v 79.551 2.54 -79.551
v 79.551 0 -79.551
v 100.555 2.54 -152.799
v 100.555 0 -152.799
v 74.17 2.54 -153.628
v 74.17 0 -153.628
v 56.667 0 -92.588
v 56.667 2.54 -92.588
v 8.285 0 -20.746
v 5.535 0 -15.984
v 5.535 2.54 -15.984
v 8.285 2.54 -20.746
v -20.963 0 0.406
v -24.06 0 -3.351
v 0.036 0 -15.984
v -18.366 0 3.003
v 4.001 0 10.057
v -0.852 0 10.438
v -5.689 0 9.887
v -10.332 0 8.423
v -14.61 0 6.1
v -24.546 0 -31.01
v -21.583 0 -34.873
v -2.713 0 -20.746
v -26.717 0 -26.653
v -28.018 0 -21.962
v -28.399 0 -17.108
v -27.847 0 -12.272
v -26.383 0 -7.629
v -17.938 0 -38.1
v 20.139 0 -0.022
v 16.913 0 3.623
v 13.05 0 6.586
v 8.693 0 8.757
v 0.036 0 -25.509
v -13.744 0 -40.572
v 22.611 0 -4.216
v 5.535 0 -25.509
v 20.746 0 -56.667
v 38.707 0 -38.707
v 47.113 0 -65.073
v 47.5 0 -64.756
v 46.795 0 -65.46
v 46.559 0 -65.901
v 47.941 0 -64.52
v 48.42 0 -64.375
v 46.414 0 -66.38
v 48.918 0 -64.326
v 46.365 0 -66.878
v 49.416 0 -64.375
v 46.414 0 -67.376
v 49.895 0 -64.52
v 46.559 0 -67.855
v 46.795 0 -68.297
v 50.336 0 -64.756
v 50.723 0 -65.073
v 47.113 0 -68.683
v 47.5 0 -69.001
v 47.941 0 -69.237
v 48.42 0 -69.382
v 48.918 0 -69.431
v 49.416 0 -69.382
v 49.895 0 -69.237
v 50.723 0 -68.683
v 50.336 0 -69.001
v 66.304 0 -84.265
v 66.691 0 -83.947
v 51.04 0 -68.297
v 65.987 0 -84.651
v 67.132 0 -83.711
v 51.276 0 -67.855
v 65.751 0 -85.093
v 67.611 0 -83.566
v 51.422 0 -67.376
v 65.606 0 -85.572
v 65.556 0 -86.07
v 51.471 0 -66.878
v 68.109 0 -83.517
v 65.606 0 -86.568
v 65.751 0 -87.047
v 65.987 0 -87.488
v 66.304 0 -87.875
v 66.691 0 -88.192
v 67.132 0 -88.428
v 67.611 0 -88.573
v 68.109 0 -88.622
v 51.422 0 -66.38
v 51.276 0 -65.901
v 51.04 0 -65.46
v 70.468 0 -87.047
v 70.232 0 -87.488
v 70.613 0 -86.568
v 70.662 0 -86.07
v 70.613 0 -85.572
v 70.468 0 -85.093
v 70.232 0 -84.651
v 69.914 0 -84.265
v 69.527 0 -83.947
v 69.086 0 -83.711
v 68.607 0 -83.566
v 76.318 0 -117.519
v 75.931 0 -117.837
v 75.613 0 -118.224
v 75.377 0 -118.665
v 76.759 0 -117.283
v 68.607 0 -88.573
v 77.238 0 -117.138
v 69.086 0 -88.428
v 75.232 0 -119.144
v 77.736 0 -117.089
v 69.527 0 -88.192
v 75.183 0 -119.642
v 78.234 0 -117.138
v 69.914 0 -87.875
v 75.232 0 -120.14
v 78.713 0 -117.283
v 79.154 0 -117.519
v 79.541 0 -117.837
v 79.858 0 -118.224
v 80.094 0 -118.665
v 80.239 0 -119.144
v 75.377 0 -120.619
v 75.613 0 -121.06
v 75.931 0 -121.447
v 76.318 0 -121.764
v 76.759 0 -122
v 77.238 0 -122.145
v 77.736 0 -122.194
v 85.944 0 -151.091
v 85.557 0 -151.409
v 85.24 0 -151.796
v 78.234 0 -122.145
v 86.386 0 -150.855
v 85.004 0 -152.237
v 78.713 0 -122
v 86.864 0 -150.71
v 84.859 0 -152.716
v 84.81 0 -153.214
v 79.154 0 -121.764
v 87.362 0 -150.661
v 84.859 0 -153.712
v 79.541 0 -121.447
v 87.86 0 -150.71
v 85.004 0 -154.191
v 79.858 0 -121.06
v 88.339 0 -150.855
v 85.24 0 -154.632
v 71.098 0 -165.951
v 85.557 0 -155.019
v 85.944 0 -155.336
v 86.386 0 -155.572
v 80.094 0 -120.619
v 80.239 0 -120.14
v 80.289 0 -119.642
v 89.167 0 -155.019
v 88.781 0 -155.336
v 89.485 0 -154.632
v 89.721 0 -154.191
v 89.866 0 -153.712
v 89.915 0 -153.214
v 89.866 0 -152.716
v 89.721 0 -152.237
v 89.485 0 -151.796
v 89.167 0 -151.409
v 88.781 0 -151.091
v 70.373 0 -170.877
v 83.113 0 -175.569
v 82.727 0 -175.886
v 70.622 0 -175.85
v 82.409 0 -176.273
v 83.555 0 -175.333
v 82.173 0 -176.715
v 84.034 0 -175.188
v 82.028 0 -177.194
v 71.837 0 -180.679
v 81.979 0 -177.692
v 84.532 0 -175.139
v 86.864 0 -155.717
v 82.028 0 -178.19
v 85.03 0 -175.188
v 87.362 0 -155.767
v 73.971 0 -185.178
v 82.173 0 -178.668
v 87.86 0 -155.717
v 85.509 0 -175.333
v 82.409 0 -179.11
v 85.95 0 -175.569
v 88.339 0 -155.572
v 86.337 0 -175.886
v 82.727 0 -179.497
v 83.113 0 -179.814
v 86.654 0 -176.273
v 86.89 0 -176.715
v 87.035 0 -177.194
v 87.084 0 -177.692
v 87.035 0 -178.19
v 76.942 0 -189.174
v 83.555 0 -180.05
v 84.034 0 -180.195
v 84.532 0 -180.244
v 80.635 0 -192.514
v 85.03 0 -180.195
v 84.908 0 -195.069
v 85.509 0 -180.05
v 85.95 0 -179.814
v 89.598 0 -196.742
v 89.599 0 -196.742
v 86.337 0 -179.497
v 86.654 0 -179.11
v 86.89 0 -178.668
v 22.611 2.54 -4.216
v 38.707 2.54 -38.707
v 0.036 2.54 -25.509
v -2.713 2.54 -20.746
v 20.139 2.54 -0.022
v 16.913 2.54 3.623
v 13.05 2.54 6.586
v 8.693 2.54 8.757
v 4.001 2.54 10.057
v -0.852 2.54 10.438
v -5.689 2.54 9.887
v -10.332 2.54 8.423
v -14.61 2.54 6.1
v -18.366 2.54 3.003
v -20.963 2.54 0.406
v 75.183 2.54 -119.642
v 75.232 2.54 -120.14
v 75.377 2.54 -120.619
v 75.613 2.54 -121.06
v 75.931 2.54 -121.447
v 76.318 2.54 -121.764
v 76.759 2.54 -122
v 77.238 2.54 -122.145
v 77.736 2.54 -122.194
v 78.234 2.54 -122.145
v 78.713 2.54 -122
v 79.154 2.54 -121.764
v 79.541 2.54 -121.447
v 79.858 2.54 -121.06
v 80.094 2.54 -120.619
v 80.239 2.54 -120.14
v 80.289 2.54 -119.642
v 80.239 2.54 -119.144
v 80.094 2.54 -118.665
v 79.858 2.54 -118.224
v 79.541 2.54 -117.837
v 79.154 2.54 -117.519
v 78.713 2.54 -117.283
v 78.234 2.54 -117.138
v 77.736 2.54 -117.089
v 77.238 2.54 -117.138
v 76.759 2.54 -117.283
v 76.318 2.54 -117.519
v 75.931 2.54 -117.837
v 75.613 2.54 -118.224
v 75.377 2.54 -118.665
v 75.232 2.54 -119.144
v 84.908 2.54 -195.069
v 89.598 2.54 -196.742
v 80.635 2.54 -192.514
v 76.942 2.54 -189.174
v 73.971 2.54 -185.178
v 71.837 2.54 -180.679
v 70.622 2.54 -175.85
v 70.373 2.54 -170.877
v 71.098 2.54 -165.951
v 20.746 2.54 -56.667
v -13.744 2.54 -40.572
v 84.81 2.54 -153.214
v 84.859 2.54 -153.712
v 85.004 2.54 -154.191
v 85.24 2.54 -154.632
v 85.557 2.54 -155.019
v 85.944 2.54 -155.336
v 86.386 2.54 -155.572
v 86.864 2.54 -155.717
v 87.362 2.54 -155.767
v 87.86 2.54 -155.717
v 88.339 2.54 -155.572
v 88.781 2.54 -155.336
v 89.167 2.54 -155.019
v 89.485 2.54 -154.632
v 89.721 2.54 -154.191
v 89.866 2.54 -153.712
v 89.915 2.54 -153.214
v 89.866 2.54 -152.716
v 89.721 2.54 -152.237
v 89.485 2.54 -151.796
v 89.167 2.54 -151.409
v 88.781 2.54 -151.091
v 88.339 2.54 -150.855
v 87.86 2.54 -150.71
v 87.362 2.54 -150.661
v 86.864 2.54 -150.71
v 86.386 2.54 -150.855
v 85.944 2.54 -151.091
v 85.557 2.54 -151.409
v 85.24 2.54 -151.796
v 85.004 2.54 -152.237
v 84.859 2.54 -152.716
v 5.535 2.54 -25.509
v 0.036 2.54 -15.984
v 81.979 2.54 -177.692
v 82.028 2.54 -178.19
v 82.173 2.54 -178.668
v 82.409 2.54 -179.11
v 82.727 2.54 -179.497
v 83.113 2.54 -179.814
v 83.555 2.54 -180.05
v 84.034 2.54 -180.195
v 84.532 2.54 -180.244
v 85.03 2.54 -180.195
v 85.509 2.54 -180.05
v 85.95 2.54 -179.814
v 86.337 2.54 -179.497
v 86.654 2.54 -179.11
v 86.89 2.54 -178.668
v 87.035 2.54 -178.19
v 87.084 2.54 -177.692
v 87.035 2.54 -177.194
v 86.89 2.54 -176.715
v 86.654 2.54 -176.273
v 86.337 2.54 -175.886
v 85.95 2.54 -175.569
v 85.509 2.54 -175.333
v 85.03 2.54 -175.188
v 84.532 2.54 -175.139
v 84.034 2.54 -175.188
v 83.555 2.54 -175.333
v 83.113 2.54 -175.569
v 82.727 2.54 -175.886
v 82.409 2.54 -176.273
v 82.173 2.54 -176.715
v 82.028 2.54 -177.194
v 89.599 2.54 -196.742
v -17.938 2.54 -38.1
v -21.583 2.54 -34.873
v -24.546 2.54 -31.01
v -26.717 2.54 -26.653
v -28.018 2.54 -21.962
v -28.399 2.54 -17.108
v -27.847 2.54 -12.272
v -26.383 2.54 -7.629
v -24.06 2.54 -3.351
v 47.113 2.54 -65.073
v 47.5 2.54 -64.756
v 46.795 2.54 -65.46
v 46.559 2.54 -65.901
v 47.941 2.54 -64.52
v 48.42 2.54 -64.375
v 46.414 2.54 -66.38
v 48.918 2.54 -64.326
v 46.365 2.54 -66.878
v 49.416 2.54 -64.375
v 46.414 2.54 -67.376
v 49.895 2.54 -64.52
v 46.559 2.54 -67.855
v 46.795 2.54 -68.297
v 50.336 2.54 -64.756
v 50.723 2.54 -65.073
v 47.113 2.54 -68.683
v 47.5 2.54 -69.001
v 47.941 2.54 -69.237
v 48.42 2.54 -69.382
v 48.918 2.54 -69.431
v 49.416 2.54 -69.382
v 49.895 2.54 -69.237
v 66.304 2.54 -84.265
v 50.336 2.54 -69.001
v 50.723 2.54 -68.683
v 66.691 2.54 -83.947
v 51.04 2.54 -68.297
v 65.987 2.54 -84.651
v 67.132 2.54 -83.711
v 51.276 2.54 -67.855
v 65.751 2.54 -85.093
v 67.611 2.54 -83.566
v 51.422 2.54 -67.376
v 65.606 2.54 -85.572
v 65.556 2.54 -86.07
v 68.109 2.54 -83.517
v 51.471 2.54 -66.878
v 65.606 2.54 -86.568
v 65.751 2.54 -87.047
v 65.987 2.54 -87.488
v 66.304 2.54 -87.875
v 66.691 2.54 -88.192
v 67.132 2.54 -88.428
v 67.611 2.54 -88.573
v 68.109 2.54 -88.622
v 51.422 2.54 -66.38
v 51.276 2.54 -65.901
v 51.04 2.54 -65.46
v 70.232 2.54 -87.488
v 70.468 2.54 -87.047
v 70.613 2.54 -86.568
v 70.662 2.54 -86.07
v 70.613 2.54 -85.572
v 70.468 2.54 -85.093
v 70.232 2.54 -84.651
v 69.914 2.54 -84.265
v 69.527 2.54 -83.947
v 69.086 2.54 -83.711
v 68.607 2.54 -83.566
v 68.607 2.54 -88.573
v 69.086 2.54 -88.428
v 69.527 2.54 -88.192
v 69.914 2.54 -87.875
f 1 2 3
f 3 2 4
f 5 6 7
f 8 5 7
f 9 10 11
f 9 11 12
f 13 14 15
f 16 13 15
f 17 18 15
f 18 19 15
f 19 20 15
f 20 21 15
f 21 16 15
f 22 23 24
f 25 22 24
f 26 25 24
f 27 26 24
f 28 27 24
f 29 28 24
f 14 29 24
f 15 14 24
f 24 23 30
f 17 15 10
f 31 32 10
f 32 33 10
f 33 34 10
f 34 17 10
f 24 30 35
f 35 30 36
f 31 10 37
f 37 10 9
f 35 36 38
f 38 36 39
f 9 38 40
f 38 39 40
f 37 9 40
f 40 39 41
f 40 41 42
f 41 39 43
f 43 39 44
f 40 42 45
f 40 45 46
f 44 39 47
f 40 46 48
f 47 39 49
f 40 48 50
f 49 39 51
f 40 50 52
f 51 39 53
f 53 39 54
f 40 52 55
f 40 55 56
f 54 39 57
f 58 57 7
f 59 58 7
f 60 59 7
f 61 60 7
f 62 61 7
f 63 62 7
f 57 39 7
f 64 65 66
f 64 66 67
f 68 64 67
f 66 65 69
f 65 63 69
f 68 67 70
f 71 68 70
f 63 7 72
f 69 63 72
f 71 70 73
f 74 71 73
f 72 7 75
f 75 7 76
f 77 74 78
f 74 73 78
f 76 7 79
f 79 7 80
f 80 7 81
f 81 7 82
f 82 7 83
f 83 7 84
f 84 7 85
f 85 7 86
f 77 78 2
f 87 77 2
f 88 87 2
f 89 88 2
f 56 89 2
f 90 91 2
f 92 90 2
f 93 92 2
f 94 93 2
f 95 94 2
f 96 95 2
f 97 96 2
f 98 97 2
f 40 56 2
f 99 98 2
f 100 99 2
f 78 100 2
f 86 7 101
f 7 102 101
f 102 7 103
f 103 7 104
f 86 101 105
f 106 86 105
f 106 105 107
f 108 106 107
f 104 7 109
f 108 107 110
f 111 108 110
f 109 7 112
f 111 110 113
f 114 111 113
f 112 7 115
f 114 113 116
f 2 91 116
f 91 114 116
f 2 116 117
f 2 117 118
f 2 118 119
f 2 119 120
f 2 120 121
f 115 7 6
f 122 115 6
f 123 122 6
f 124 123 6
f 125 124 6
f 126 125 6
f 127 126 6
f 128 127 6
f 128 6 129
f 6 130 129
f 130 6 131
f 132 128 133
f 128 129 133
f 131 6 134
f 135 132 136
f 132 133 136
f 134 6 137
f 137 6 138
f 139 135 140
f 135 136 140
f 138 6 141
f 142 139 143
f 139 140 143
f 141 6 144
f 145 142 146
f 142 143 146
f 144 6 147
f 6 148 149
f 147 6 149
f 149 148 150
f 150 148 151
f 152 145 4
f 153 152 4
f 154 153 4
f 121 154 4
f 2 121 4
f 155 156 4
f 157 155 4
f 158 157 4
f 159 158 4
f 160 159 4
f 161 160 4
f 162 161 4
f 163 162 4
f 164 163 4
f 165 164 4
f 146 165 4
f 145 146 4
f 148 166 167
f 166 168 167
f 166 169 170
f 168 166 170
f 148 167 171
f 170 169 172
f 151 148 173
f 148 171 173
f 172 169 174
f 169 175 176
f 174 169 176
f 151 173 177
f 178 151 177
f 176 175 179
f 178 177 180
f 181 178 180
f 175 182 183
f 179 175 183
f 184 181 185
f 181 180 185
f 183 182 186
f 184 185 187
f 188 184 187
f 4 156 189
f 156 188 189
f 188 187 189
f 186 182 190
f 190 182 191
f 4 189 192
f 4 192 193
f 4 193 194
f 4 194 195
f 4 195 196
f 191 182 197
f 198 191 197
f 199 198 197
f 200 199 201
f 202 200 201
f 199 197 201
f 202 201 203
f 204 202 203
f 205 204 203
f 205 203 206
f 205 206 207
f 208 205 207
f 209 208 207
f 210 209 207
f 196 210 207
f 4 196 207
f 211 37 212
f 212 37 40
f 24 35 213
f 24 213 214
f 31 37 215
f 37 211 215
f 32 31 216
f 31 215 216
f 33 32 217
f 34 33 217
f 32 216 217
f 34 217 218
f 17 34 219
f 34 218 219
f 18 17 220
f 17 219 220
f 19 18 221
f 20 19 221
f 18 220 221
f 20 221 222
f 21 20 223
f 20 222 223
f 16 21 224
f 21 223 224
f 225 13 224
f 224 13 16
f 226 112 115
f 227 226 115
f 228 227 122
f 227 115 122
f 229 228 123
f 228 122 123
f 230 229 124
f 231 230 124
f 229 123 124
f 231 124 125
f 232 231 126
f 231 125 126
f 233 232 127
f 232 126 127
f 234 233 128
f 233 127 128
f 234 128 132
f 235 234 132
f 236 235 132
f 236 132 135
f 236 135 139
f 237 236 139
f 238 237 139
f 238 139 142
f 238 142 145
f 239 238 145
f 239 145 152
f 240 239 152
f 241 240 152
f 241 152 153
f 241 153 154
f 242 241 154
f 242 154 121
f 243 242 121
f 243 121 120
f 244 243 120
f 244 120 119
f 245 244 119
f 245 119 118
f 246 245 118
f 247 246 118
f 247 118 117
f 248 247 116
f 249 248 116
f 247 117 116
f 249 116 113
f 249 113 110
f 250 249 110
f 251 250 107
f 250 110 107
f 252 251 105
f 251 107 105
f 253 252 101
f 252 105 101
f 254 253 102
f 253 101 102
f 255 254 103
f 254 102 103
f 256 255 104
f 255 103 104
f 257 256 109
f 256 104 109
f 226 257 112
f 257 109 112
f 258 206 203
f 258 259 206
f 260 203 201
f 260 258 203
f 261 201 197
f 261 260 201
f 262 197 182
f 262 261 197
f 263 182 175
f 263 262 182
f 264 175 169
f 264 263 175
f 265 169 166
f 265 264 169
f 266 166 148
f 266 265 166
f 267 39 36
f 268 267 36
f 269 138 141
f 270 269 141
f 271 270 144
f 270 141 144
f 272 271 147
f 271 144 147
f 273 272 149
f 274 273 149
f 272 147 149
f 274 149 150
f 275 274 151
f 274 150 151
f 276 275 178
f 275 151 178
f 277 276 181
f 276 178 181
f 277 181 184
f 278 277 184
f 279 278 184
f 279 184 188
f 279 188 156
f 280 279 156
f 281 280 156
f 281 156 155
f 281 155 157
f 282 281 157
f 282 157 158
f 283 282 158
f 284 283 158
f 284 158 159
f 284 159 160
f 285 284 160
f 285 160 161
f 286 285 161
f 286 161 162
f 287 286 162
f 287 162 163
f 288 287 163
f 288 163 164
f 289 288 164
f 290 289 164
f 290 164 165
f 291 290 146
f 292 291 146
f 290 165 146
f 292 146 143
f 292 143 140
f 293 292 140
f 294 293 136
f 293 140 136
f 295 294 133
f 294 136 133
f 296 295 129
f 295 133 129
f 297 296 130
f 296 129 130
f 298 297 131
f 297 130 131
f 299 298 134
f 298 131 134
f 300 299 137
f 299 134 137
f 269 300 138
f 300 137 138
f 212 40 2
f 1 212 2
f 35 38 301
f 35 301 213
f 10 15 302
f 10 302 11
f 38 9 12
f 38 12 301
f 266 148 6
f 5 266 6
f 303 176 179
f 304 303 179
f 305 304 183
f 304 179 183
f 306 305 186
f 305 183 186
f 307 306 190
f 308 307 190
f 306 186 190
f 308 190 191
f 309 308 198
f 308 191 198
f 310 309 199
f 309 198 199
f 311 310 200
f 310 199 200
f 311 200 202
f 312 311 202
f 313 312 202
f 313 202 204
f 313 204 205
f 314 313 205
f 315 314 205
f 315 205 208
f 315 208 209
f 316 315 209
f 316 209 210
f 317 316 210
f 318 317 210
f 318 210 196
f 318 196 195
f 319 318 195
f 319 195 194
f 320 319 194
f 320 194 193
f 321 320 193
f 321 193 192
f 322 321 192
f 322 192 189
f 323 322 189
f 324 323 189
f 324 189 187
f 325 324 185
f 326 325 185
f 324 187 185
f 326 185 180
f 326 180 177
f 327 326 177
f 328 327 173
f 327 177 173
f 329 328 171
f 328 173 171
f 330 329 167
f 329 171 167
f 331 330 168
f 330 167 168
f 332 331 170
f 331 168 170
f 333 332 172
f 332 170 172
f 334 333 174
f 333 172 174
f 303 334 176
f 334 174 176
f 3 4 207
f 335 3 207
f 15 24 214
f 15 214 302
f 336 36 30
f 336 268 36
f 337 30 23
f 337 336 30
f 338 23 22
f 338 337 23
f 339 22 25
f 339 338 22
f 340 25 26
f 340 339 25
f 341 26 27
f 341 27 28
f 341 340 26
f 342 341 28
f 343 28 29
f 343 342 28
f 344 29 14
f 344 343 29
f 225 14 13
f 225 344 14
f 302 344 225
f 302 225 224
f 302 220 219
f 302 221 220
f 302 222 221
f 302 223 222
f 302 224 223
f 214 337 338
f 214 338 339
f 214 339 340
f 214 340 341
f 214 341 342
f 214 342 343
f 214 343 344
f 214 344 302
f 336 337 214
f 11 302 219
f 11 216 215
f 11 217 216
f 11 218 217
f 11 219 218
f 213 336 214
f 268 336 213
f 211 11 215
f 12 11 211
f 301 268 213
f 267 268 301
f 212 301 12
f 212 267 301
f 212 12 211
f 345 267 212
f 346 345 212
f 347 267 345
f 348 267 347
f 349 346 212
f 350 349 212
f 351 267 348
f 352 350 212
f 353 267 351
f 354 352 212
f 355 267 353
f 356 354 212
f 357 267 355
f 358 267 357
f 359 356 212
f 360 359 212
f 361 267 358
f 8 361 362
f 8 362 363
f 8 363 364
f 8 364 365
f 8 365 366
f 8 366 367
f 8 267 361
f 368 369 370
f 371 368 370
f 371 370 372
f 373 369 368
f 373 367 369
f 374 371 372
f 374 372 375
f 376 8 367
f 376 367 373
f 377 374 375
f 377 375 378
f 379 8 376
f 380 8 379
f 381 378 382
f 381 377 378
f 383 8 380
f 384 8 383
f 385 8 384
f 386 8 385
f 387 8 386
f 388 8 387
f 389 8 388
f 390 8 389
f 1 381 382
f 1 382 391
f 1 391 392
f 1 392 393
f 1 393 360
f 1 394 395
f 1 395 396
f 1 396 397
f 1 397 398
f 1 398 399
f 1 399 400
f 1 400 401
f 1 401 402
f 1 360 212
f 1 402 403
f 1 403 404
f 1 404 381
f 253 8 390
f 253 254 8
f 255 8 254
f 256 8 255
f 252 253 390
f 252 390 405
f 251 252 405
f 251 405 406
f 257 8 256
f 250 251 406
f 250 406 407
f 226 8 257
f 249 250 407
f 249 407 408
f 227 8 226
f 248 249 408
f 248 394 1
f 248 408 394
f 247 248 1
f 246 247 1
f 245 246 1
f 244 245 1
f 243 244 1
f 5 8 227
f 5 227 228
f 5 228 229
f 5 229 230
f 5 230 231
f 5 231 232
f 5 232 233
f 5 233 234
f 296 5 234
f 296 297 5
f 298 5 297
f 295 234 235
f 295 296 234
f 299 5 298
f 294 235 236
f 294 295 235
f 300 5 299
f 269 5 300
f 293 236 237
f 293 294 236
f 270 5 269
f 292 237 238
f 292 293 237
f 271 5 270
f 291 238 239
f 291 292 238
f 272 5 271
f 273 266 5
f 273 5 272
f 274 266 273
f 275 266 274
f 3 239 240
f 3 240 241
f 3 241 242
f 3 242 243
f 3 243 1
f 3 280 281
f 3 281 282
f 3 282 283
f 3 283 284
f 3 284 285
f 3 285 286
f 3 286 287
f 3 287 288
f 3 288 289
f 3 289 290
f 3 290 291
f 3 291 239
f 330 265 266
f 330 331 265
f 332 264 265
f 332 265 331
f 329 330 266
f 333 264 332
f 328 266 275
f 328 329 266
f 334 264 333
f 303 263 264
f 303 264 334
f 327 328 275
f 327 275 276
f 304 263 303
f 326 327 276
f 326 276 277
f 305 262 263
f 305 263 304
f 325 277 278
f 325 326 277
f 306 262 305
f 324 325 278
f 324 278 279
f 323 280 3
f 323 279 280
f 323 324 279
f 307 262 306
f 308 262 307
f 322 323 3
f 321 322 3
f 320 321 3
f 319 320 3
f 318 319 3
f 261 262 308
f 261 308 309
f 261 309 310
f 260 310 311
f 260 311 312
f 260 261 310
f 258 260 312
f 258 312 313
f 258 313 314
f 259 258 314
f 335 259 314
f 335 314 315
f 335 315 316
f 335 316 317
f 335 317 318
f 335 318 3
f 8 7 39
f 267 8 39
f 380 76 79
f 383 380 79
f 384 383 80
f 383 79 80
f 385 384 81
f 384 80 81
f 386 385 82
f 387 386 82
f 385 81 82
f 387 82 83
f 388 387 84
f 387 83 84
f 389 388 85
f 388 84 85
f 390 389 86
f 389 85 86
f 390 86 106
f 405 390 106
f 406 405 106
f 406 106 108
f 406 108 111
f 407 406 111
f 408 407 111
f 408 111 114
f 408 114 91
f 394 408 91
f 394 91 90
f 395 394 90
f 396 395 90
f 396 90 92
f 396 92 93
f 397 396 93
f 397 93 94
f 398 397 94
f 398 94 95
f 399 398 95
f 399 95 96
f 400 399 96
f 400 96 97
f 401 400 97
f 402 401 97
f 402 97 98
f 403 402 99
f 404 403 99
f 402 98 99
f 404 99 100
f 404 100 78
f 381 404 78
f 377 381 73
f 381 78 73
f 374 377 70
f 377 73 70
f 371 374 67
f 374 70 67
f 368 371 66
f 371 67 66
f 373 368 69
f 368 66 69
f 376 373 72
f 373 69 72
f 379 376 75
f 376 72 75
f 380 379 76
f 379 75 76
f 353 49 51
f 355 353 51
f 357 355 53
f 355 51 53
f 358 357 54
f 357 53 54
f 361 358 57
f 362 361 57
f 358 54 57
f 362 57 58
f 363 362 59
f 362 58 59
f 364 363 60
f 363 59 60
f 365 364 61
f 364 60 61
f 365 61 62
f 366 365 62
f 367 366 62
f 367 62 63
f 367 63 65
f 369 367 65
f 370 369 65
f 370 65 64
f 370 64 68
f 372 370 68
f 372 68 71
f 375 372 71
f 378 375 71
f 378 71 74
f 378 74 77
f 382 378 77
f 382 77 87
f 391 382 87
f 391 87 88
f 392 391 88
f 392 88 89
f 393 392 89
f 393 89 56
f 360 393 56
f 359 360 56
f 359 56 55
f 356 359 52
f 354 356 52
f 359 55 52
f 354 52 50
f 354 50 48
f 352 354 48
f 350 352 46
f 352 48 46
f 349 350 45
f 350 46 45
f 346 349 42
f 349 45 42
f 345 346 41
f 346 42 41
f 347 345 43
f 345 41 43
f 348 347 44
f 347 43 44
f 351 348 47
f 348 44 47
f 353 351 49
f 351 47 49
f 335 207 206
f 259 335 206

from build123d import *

# Parameters (mm, degrees)
BOSS_EXTRUDE1_DEPTH        = 2.54
FILLET3_R                  = 25.4
F_10_CLEARANCE_HOLE1_D     = 5.1054
F_10_CLEARANCE_HOLE1_DEPTH = 9.906
F_10_CLEARANCE_HOLE1_TIP   = 1.533816902
FILLET4_R                  = 25.4


with BuildPart() as part:
    # Sketch1 → Boss-Extrude1 (new body)
    with BuildSketch(Plane(origin=(0, 0, 0), x_dir=(1, 0, 0), z_dir=(0, 1, 0))):
        Polygon((38.706788555, 38.706788555), (79.551048595, 79.551048595), (100.554615109, 152.799189826), (89.598560117, 196.741526293), (64.953048669, 190.596710145), (74.170272892, 153.628442974), (56.667300797, 92.588325282), (20.746276313, 56.667300797), (-46.605644595, 25.236404374), (7.275892132, -28.645132353), align=None)
        Polygon((8.285025385, 20.746276313), (5.535394728, 25.508776313), (0.036133414, 25.508776313), (-2.713497243, 20.746276313), (0.036133414, 15.983776313), (5.535394728, 15.983776313), align=None, mode=Mode.SUBTRACT)
    extrude(amount=BOSS_EXTRUDE1_DEPTH)

    # Fillet3
    fillet3_edges = [part.edges().sort_by_distance(p)[0] for p in [
        (64.953048669, 1.27, -190.596710145),
    ]]
    fillet(fillet3_edges, radius=FILLET3_R - 0.0001)  # a hair under: the kernel refuses the full size

    # #10 Clearance Hole1
    with Locations(Plane(origin=(0, 2.54, 0), x_dir=(1, 0, 0), z_dir=(0, 1, 0))):
        with Locations((84.531663752, 177.691526293), (87.362444, 153.2138164), (77.735809348, 119.641751669), (68.109174696, 86.069686939), (48.917853565, 66.878365807)):
            Hole(F_10_CLEARANCE_HOLE1_D / 2, depth=F_10_CLEARANCE_HOLE1_DEPTH)
            with Locations((0, 0, -(F_10_CLEARANCE_HOLE1_DEPTH + F_10_CLEARANCE_HOLE1_TIP / 2))):  # 118° drill point
                Cone(0, F_10_CLEARANCE_HOLE1_D / 2, F_10_CLEARANCE_HOLE1_TIP, mode=Mode.SUBTRACT)

    # Fillet4
    fillet4_edges = [part.edges().sort_by_distance(p)[0] for p in [
        (7.275892132, 1.27, 28.645132353),
        (-46.605644595, 1.27, -25.236404374),
    ]]
    fillet(fillet4_edges, radius=FILLET4_R)


solid = part.part
